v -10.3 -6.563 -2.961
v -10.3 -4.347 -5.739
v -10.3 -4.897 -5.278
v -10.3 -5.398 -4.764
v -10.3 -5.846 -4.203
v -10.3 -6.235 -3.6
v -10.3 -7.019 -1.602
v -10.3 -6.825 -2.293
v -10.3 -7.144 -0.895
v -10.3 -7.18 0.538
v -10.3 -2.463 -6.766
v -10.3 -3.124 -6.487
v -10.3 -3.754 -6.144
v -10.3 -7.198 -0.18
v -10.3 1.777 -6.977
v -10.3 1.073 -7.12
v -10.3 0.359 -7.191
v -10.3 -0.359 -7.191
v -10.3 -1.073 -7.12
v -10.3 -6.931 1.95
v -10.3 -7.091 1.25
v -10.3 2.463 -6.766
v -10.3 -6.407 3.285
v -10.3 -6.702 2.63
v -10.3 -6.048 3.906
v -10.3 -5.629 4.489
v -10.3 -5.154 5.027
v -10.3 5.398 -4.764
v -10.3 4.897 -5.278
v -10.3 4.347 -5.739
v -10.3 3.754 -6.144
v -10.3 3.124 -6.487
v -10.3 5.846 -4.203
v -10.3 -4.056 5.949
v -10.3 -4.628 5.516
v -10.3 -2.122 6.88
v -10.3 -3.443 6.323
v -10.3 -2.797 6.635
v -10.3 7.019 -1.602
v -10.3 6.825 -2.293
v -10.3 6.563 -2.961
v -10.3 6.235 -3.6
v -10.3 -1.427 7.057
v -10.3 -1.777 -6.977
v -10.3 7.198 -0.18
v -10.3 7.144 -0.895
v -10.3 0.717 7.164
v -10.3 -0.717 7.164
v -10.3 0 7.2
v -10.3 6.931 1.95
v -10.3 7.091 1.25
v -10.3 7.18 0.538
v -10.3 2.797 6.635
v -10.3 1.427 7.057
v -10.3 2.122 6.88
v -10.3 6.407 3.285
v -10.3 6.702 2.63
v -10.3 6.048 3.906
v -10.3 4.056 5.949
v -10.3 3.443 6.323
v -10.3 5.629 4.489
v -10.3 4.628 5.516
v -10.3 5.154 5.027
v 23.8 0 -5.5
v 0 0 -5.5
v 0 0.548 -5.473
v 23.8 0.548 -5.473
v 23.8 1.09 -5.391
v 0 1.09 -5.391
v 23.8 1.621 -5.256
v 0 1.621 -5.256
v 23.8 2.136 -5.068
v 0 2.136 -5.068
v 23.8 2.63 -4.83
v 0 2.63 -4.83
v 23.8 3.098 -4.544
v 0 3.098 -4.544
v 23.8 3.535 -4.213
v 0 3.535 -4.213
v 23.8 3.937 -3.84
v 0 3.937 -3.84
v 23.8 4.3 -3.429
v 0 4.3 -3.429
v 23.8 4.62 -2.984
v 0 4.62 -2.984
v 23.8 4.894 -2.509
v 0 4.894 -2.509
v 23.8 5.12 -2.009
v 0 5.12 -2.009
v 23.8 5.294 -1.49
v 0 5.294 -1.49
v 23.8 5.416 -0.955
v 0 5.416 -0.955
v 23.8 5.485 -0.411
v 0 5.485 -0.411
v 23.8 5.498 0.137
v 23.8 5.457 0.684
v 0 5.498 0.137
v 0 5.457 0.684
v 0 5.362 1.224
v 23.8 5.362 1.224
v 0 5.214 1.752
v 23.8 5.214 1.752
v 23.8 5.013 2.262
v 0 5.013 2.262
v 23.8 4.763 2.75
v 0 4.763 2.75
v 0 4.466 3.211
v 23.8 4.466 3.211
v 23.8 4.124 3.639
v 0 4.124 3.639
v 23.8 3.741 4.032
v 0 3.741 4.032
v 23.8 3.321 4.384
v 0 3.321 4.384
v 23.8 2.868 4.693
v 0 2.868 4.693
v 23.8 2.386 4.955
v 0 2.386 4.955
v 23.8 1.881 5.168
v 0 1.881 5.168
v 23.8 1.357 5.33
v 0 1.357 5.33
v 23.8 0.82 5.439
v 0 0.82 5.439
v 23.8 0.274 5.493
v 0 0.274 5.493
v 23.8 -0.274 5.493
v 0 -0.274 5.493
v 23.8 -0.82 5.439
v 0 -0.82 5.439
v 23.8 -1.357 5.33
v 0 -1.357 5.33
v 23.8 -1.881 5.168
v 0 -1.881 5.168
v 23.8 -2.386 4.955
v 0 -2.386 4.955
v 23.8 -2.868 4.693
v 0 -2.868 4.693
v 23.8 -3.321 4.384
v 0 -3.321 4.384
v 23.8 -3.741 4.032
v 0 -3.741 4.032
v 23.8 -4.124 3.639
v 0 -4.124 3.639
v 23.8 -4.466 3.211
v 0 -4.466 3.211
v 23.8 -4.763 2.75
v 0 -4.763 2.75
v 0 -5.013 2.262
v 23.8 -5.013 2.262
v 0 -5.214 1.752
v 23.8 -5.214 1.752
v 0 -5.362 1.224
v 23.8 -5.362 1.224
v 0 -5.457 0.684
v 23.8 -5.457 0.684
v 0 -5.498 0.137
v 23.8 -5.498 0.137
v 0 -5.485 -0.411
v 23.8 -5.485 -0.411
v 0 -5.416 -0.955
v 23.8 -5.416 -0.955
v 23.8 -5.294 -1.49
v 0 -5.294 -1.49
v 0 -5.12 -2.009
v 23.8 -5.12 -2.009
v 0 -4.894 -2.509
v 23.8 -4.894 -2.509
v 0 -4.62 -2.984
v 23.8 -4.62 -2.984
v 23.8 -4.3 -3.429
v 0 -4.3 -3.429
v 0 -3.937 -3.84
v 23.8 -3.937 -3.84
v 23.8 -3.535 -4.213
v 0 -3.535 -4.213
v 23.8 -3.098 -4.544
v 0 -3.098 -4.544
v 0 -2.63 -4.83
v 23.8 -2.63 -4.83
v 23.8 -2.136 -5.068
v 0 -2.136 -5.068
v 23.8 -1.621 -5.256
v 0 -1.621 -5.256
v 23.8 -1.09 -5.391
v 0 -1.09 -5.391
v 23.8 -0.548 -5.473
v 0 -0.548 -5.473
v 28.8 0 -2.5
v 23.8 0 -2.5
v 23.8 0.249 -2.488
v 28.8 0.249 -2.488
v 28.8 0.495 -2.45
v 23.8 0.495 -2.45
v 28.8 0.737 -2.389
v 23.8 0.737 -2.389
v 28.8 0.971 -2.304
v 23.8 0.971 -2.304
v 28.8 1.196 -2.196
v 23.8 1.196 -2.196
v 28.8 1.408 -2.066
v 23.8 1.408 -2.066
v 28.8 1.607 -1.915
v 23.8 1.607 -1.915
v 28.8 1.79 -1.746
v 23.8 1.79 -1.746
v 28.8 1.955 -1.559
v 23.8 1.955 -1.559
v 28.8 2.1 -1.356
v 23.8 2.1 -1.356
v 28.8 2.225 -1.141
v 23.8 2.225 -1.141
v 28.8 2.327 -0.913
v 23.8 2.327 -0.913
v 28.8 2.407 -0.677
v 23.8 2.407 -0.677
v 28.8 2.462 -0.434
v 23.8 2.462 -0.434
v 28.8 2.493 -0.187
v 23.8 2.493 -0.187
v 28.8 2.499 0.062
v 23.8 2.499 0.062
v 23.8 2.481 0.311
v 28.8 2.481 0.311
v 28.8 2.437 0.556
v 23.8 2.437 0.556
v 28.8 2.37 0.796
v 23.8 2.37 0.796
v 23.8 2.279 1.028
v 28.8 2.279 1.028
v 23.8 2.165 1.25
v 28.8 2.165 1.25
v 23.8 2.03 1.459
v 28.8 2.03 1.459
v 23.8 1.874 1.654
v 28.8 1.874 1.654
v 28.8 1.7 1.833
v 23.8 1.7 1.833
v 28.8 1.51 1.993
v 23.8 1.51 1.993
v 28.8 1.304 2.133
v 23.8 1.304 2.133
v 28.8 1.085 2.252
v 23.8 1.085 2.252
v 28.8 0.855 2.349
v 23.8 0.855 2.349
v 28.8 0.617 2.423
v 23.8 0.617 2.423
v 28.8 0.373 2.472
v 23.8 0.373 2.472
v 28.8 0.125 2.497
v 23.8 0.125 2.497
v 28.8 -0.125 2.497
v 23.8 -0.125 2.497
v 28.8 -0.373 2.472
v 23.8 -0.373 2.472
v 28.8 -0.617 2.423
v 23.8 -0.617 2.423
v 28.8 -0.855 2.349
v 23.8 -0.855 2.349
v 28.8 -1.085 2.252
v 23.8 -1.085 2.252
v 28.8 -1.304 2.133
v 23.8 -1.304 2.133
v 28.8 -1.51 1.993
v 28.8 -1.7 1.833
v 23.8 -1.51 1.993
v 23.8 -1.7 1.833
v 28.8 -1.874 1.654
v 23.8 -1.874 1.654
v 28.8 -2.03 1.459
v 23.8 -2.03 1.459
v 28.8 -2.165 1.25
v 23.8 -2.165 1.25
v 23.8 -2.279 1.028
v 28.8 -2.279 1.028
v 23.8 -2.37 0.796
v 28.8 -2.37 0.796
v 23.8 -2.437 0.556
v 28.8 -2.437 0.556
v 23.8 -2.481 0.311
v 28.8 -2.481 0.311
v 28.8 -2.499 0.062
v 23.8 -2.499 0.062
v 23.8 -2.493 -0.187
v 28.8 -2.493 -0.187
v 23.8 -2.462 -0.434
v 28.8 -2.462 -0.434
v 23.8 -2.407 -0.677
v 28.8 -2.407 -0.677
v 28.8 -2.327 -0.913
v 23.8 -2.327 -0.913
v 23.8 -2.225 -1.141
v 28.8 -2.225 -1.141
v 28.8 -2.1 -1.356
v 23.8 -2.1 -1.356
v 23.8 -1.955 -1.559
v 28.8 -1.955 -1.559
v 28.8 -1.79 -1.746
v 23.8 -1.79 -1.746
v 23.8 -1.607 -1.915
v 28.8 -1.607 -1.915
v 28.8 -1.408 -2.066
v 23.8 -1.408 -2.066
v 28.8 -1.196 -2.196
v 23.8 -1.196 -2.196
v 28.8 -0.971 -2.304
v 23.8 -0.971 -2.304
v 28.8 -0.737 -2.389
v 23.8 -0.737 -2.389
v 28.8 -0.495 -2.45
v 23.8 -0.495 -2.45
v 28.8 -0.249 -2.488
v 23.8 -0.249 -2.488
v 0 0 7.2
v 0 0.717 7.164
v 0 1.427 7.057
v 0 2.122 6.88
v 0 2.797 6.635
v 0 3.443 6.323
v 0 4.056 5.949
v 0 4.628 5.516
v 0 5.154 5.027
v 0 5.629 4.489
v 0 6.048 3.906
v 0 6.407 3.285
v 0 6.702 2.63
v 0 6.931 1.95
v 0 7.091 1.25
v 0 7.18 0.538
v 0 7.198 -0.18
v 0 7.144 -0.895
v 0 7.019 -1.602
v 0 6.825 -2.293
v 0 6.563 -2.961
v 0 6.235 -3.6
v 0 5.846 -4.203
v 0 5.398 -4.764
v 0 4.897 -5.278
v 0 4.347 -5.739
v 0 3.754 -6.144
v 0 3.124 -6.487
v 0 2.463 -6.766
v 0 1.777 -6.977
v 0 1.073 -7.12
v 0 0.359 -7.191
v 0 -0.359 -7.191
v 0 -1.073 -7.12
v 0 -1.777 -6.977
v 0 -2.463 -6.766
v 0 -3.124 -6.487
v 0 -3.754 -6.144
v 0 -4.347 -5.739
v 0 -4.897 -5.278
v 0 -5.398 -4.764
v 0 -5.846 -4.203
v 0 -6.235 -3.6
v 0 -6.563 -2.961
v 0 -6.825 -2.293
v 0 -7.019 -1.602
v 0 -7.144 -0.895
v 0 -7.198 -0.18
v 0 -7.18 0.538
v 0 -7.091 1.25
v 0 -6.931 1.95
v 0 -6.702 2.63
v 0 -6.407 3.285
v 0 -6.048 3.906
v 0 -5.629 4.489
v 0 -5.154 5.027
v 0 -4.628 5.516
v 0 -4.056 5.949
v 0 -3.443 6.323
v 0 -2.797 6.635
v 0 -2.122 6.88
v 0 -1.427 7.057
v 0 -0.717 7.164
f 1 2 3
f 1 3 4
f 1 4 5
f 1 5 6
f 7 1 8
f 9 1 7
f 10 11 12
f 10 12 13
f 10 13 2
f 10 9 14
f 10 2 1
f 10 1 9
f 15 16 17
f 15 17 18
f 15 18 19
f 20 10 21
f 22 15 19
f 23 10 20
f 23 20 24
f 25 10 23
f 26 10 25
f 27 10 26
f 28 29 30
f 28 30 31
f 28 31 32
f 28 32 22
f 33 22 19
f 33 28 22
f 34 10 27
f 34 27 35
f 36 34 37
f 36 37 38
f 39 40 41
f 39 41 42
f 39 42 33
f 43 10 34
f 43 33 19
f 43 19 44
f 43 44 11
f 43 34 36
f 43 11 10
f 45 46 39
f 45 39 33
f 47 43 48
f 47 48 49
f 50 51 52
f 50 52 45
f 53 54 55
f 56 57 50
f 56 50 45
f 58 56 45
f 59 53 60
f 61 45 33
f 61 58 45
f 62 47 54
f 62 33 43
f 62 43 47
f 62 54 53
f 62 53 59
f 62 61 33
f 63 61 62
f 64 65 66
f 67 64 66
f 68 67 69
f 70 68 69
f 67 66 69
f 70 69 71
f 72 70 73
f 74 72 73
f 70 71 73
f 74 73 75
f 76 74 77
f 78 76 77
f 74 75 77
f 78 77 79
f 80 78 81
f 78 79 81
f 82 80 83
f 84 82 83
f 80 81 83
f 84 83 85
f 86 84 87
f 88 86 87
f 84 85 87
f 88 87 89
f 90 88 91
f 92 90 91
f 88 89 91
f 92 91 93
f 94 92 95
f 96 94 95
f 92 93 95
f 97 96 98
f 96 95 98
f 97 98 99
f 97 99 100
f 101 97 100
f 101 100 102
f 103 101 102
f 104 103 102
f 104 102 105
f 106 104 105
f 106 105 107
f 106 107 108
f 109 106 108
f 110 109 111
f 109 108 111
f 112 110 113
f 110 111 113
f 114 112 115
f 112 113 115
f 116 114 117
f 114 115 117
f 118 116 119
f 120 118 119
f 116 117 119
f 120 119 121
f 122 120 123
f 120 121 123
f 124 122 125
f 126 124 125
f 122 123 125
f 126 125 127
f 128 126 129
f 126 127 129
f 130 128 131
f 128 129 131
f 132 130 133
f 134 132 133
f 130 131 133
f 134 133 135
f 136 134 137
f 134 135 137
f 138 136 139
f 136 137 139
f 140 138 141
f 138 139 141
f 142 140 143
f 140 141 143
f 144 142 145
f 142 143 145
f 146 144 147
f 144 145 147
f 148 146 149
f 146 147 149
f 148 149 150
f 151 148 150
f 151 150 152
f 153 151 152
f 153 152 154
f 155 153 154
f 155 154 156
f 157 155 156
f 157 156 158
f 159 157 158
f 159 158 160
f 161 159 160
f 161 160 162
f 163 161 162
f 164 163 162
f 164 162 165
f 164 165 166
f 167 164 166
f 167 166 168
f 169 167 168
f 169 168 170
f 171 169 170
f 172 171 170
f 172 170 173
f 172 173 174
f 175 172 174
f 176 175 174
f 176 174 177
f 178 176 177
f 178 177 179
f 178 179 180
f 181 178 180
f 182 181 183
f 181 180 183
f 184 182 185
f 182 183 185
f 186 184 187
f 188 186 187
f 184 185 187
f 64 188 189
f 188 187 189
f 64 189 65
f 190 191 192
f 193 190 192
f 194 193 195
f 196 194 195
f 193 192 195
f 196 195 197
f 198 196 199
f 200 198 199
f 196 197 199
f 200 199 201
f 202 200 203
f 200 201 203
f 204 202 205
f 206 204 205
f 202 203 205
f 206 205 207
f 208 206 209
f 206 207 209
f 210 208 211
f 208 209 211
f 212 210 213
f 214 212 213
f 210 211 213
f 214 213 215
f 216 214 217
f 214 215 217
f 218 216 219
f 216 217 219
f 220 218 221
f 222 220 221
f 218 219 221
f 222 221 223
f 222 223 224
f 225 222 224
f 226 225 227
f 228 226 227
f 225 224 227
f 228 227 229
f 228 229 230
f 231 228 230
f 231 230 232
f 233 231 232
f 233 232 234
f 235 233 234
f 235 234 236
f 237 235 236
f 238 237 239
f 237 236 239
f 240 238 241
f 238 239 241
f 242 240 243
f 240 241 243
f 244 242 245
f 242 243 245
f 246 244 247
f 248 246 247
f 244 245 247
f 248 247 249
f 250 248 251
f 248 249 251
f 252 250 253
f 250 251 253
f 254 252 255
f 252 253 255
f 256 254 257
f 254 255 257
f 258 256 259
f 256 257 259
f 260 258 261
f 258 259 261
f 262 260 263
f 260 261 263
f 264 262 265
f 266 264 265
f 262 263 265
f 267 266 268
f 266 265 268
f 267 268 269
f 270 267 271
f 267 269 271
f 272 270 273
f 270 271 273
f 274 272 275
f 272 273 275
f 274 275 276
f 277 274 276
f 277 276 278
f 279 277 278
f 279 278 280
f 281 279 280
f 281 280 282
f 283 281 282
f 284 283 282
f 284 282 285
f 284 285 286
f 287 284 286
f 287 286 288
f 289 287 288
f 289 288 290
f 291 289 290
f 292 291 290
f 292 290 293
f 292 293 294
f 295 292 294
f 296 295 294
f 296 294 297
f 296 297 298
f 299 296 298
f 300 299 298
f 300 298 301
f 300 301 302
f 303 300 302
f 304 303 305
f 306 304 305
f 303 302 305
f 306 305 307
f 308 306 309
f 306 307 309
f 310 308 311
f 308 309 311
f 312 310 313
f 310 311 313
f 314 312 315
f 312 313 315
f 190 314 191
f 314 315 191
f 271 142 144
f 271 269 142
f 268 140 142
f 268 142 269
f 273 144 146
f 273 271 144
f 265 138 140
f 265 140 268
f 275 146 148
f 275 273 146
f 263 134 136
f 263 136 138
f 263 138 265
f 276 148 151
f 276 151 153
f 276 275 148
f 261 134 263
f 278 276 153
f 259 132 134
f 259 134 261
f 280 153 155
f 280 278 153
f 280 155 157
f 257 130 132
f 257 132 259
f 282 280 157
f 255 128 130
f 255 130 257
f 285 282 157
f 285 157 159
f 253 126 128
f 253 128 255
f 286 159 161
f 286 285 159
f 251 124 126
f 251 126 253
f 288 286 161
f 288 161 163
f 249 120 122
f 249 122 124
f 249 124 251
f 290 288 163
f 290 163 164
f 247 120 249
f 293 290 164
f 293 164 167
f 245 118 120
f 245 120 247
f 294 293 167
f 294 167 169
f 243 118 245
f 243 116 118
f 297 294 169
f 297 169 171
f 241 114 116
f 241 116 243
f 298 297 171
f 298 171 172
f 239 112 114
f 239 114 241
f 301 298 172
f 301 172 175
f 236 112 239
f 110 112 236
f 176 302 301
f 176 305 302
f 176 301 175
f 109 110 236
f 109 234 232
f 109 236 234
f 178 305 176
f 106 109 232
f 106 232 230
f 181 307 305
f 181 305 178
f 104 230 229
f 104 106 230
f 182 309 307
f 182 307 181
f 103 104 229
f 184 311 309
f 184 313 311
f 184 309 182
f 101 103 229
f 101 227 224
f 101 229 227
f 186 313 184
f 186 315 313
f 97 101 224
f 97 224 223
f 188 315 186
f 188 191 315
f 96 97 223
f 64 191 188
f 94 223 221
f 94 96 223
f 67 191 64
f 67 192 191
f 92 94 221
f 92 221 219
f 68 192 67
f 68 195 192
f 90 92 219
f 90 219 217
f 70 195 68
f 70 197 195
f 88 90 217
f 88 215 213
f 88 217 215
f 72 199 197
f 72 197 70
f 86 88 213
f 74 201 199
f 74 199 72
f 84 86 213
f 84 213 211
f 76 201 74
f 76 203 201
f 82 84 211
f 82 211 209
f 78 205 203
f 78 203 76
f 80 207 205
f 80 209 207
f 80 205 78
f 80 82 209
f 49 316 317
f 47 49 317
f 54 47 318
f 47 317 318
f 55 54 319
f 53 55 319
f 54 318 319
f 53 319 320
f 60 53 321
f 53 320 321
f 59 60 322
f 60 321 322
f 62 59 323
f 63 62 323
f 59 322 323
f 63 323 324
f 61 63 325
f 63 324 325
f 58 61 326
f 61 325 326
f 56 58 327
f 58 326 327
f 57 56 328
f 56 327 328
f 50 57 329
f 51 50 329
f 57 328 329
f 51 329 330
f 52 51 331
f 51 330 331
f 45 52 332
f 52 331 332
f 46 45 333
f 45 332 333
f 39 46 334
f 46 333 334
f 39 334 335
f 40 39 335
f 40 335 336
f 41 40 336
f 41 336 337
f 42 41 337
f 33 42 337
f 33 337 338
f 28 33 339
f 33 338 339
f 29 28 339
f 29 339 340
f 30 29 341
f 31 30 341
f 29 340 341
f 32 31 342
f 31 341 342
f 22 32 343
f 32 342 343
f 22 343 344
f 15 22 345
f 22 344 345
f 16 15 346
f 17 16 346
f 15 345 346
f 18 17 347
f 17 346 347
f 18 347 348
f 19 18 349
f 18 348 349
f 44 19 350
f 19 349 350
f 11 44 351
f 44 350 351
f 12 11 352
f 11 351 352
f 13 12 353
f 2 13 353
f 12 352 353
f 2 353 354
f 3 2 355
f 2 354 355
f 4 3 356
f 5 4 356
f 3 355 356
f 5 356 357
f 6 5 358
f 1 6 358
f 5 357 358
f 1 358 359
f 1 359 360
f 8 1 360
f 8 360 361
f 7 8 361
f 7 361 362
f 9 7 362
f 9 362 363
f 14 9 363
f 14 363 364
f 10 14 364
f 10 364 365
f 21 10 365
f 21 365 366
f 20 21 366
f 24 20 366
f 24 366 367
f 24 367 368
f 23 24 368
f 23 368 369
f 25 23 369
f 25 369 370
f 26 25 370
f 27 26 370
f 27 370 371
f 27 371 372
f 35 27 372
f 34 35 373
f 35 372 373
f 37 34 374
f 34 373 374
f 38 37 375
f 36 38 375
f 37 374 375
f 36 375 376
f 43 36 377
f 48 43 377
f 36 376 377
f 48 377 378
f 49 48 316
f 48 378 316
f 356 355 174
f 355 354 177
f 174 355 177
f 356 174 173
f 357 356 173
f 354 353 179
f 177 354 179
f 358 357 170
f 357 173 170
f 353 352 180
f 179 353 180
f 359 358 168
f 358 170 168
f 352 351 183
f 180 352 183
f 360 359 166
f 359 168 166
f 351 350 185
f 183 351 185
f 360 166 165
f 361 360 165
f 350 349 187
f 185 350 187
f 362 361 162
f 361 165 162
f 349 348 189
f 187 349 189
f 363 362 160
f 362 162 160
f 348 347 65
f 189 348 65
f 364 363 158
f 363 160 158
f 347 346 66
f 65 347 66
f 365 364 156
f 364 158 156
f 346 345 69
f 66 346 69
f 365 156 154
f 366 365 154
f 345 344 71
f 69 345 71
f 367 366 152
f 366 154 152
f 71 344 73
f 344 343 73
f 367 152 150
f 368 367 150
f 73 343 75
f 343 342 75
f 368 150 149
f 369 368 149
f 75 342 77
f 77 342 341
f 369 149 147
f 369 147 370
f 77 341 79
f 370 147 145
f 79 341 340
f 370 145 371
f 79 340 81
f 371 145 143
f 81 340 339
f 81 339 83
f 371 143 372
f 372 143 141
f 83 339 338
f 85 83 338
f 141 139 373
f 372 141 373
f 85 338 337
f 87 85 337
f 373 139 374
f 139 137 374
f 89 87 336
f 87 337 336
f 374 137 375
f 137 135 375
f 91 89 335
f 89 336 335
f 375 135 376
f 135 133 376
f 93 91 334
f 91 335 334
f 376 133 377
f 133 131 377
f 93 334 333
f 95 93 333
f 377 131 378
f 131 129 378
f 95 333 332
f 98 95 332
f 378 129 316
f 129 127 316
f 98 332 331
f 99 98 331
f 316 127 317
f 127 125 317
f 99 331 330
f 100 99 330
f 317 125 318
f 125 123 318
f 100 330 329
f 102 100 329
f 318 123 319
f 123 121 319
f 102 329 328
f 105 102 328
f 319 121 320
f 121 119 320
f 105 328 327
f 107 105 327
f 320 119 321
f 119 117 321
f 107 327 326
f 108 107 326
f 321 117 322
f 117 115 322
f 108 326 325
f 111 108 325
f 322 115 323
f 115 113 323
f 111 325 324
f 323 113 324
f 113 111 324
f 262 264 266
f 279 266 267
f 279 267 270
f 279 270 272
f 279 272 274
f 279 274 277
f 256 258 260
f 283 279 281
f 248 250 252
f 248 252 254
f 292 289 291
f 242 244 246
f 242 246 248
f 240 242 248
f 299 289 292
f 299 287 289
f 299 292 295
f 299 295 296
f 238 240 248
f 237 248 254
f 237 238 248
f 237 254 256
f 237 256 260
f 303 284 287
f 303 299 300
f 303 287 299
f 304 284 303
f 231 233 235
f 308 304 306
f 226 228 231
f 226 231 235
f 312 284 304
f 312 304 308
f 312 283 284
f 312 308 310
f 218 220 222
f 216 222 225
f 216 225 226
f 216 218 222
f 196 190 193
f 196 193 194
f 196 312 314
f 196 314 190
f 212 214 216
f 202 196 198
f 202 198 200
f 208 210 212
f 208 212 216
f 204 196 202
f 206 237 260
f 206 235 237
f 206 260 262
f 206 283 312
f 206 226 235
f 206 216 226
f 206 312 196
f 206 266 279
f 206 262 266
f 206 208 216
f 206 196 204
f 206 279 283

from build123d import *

# Parameters (mm, degrees)
SKETCH1_R           = 5.5
BOSS_EXTRUDE2_DEPTH = 23.8
SKETCH2_R           = 7.2
BOSS_EXTRUDE4_DEPTH = 10.3
SKETCH3_R           = 2.5
BOSS_EXTRUDE5_DEPTH = 5


with BuildPart() as part:
    # Sketch1 → Boss-Extrude2 (new body)
    with BuildSketch(Plane(origin=(0, 0, 0), x_dir=(0, 0, -1), z_dir=(1, 0, 0))):
        Circle(SKETCH1_R)
    extrude(amount=BOSS_EXTRUDE2_DEPTH)

    # Sketch2 → Boss-Extrude4 (add)
    with BuildSketch(Plane.ZY):
        Circle(SKETCH2_R)
    extrude(amount=BOSS_EXTRUDE4_DEPTH)

    # Sketch3 → Boss-Extrude5 (add)
    with BuildSketch(Plane(origin=(23.8, 0, 0), x_dir=(0, 0, -1), z_dir=(1, 0, 0))):
        Circle(SKETCH3_R)
    extrude(amount=BOSS_EXTRUDE5_DEPTH)


solid = part.part
